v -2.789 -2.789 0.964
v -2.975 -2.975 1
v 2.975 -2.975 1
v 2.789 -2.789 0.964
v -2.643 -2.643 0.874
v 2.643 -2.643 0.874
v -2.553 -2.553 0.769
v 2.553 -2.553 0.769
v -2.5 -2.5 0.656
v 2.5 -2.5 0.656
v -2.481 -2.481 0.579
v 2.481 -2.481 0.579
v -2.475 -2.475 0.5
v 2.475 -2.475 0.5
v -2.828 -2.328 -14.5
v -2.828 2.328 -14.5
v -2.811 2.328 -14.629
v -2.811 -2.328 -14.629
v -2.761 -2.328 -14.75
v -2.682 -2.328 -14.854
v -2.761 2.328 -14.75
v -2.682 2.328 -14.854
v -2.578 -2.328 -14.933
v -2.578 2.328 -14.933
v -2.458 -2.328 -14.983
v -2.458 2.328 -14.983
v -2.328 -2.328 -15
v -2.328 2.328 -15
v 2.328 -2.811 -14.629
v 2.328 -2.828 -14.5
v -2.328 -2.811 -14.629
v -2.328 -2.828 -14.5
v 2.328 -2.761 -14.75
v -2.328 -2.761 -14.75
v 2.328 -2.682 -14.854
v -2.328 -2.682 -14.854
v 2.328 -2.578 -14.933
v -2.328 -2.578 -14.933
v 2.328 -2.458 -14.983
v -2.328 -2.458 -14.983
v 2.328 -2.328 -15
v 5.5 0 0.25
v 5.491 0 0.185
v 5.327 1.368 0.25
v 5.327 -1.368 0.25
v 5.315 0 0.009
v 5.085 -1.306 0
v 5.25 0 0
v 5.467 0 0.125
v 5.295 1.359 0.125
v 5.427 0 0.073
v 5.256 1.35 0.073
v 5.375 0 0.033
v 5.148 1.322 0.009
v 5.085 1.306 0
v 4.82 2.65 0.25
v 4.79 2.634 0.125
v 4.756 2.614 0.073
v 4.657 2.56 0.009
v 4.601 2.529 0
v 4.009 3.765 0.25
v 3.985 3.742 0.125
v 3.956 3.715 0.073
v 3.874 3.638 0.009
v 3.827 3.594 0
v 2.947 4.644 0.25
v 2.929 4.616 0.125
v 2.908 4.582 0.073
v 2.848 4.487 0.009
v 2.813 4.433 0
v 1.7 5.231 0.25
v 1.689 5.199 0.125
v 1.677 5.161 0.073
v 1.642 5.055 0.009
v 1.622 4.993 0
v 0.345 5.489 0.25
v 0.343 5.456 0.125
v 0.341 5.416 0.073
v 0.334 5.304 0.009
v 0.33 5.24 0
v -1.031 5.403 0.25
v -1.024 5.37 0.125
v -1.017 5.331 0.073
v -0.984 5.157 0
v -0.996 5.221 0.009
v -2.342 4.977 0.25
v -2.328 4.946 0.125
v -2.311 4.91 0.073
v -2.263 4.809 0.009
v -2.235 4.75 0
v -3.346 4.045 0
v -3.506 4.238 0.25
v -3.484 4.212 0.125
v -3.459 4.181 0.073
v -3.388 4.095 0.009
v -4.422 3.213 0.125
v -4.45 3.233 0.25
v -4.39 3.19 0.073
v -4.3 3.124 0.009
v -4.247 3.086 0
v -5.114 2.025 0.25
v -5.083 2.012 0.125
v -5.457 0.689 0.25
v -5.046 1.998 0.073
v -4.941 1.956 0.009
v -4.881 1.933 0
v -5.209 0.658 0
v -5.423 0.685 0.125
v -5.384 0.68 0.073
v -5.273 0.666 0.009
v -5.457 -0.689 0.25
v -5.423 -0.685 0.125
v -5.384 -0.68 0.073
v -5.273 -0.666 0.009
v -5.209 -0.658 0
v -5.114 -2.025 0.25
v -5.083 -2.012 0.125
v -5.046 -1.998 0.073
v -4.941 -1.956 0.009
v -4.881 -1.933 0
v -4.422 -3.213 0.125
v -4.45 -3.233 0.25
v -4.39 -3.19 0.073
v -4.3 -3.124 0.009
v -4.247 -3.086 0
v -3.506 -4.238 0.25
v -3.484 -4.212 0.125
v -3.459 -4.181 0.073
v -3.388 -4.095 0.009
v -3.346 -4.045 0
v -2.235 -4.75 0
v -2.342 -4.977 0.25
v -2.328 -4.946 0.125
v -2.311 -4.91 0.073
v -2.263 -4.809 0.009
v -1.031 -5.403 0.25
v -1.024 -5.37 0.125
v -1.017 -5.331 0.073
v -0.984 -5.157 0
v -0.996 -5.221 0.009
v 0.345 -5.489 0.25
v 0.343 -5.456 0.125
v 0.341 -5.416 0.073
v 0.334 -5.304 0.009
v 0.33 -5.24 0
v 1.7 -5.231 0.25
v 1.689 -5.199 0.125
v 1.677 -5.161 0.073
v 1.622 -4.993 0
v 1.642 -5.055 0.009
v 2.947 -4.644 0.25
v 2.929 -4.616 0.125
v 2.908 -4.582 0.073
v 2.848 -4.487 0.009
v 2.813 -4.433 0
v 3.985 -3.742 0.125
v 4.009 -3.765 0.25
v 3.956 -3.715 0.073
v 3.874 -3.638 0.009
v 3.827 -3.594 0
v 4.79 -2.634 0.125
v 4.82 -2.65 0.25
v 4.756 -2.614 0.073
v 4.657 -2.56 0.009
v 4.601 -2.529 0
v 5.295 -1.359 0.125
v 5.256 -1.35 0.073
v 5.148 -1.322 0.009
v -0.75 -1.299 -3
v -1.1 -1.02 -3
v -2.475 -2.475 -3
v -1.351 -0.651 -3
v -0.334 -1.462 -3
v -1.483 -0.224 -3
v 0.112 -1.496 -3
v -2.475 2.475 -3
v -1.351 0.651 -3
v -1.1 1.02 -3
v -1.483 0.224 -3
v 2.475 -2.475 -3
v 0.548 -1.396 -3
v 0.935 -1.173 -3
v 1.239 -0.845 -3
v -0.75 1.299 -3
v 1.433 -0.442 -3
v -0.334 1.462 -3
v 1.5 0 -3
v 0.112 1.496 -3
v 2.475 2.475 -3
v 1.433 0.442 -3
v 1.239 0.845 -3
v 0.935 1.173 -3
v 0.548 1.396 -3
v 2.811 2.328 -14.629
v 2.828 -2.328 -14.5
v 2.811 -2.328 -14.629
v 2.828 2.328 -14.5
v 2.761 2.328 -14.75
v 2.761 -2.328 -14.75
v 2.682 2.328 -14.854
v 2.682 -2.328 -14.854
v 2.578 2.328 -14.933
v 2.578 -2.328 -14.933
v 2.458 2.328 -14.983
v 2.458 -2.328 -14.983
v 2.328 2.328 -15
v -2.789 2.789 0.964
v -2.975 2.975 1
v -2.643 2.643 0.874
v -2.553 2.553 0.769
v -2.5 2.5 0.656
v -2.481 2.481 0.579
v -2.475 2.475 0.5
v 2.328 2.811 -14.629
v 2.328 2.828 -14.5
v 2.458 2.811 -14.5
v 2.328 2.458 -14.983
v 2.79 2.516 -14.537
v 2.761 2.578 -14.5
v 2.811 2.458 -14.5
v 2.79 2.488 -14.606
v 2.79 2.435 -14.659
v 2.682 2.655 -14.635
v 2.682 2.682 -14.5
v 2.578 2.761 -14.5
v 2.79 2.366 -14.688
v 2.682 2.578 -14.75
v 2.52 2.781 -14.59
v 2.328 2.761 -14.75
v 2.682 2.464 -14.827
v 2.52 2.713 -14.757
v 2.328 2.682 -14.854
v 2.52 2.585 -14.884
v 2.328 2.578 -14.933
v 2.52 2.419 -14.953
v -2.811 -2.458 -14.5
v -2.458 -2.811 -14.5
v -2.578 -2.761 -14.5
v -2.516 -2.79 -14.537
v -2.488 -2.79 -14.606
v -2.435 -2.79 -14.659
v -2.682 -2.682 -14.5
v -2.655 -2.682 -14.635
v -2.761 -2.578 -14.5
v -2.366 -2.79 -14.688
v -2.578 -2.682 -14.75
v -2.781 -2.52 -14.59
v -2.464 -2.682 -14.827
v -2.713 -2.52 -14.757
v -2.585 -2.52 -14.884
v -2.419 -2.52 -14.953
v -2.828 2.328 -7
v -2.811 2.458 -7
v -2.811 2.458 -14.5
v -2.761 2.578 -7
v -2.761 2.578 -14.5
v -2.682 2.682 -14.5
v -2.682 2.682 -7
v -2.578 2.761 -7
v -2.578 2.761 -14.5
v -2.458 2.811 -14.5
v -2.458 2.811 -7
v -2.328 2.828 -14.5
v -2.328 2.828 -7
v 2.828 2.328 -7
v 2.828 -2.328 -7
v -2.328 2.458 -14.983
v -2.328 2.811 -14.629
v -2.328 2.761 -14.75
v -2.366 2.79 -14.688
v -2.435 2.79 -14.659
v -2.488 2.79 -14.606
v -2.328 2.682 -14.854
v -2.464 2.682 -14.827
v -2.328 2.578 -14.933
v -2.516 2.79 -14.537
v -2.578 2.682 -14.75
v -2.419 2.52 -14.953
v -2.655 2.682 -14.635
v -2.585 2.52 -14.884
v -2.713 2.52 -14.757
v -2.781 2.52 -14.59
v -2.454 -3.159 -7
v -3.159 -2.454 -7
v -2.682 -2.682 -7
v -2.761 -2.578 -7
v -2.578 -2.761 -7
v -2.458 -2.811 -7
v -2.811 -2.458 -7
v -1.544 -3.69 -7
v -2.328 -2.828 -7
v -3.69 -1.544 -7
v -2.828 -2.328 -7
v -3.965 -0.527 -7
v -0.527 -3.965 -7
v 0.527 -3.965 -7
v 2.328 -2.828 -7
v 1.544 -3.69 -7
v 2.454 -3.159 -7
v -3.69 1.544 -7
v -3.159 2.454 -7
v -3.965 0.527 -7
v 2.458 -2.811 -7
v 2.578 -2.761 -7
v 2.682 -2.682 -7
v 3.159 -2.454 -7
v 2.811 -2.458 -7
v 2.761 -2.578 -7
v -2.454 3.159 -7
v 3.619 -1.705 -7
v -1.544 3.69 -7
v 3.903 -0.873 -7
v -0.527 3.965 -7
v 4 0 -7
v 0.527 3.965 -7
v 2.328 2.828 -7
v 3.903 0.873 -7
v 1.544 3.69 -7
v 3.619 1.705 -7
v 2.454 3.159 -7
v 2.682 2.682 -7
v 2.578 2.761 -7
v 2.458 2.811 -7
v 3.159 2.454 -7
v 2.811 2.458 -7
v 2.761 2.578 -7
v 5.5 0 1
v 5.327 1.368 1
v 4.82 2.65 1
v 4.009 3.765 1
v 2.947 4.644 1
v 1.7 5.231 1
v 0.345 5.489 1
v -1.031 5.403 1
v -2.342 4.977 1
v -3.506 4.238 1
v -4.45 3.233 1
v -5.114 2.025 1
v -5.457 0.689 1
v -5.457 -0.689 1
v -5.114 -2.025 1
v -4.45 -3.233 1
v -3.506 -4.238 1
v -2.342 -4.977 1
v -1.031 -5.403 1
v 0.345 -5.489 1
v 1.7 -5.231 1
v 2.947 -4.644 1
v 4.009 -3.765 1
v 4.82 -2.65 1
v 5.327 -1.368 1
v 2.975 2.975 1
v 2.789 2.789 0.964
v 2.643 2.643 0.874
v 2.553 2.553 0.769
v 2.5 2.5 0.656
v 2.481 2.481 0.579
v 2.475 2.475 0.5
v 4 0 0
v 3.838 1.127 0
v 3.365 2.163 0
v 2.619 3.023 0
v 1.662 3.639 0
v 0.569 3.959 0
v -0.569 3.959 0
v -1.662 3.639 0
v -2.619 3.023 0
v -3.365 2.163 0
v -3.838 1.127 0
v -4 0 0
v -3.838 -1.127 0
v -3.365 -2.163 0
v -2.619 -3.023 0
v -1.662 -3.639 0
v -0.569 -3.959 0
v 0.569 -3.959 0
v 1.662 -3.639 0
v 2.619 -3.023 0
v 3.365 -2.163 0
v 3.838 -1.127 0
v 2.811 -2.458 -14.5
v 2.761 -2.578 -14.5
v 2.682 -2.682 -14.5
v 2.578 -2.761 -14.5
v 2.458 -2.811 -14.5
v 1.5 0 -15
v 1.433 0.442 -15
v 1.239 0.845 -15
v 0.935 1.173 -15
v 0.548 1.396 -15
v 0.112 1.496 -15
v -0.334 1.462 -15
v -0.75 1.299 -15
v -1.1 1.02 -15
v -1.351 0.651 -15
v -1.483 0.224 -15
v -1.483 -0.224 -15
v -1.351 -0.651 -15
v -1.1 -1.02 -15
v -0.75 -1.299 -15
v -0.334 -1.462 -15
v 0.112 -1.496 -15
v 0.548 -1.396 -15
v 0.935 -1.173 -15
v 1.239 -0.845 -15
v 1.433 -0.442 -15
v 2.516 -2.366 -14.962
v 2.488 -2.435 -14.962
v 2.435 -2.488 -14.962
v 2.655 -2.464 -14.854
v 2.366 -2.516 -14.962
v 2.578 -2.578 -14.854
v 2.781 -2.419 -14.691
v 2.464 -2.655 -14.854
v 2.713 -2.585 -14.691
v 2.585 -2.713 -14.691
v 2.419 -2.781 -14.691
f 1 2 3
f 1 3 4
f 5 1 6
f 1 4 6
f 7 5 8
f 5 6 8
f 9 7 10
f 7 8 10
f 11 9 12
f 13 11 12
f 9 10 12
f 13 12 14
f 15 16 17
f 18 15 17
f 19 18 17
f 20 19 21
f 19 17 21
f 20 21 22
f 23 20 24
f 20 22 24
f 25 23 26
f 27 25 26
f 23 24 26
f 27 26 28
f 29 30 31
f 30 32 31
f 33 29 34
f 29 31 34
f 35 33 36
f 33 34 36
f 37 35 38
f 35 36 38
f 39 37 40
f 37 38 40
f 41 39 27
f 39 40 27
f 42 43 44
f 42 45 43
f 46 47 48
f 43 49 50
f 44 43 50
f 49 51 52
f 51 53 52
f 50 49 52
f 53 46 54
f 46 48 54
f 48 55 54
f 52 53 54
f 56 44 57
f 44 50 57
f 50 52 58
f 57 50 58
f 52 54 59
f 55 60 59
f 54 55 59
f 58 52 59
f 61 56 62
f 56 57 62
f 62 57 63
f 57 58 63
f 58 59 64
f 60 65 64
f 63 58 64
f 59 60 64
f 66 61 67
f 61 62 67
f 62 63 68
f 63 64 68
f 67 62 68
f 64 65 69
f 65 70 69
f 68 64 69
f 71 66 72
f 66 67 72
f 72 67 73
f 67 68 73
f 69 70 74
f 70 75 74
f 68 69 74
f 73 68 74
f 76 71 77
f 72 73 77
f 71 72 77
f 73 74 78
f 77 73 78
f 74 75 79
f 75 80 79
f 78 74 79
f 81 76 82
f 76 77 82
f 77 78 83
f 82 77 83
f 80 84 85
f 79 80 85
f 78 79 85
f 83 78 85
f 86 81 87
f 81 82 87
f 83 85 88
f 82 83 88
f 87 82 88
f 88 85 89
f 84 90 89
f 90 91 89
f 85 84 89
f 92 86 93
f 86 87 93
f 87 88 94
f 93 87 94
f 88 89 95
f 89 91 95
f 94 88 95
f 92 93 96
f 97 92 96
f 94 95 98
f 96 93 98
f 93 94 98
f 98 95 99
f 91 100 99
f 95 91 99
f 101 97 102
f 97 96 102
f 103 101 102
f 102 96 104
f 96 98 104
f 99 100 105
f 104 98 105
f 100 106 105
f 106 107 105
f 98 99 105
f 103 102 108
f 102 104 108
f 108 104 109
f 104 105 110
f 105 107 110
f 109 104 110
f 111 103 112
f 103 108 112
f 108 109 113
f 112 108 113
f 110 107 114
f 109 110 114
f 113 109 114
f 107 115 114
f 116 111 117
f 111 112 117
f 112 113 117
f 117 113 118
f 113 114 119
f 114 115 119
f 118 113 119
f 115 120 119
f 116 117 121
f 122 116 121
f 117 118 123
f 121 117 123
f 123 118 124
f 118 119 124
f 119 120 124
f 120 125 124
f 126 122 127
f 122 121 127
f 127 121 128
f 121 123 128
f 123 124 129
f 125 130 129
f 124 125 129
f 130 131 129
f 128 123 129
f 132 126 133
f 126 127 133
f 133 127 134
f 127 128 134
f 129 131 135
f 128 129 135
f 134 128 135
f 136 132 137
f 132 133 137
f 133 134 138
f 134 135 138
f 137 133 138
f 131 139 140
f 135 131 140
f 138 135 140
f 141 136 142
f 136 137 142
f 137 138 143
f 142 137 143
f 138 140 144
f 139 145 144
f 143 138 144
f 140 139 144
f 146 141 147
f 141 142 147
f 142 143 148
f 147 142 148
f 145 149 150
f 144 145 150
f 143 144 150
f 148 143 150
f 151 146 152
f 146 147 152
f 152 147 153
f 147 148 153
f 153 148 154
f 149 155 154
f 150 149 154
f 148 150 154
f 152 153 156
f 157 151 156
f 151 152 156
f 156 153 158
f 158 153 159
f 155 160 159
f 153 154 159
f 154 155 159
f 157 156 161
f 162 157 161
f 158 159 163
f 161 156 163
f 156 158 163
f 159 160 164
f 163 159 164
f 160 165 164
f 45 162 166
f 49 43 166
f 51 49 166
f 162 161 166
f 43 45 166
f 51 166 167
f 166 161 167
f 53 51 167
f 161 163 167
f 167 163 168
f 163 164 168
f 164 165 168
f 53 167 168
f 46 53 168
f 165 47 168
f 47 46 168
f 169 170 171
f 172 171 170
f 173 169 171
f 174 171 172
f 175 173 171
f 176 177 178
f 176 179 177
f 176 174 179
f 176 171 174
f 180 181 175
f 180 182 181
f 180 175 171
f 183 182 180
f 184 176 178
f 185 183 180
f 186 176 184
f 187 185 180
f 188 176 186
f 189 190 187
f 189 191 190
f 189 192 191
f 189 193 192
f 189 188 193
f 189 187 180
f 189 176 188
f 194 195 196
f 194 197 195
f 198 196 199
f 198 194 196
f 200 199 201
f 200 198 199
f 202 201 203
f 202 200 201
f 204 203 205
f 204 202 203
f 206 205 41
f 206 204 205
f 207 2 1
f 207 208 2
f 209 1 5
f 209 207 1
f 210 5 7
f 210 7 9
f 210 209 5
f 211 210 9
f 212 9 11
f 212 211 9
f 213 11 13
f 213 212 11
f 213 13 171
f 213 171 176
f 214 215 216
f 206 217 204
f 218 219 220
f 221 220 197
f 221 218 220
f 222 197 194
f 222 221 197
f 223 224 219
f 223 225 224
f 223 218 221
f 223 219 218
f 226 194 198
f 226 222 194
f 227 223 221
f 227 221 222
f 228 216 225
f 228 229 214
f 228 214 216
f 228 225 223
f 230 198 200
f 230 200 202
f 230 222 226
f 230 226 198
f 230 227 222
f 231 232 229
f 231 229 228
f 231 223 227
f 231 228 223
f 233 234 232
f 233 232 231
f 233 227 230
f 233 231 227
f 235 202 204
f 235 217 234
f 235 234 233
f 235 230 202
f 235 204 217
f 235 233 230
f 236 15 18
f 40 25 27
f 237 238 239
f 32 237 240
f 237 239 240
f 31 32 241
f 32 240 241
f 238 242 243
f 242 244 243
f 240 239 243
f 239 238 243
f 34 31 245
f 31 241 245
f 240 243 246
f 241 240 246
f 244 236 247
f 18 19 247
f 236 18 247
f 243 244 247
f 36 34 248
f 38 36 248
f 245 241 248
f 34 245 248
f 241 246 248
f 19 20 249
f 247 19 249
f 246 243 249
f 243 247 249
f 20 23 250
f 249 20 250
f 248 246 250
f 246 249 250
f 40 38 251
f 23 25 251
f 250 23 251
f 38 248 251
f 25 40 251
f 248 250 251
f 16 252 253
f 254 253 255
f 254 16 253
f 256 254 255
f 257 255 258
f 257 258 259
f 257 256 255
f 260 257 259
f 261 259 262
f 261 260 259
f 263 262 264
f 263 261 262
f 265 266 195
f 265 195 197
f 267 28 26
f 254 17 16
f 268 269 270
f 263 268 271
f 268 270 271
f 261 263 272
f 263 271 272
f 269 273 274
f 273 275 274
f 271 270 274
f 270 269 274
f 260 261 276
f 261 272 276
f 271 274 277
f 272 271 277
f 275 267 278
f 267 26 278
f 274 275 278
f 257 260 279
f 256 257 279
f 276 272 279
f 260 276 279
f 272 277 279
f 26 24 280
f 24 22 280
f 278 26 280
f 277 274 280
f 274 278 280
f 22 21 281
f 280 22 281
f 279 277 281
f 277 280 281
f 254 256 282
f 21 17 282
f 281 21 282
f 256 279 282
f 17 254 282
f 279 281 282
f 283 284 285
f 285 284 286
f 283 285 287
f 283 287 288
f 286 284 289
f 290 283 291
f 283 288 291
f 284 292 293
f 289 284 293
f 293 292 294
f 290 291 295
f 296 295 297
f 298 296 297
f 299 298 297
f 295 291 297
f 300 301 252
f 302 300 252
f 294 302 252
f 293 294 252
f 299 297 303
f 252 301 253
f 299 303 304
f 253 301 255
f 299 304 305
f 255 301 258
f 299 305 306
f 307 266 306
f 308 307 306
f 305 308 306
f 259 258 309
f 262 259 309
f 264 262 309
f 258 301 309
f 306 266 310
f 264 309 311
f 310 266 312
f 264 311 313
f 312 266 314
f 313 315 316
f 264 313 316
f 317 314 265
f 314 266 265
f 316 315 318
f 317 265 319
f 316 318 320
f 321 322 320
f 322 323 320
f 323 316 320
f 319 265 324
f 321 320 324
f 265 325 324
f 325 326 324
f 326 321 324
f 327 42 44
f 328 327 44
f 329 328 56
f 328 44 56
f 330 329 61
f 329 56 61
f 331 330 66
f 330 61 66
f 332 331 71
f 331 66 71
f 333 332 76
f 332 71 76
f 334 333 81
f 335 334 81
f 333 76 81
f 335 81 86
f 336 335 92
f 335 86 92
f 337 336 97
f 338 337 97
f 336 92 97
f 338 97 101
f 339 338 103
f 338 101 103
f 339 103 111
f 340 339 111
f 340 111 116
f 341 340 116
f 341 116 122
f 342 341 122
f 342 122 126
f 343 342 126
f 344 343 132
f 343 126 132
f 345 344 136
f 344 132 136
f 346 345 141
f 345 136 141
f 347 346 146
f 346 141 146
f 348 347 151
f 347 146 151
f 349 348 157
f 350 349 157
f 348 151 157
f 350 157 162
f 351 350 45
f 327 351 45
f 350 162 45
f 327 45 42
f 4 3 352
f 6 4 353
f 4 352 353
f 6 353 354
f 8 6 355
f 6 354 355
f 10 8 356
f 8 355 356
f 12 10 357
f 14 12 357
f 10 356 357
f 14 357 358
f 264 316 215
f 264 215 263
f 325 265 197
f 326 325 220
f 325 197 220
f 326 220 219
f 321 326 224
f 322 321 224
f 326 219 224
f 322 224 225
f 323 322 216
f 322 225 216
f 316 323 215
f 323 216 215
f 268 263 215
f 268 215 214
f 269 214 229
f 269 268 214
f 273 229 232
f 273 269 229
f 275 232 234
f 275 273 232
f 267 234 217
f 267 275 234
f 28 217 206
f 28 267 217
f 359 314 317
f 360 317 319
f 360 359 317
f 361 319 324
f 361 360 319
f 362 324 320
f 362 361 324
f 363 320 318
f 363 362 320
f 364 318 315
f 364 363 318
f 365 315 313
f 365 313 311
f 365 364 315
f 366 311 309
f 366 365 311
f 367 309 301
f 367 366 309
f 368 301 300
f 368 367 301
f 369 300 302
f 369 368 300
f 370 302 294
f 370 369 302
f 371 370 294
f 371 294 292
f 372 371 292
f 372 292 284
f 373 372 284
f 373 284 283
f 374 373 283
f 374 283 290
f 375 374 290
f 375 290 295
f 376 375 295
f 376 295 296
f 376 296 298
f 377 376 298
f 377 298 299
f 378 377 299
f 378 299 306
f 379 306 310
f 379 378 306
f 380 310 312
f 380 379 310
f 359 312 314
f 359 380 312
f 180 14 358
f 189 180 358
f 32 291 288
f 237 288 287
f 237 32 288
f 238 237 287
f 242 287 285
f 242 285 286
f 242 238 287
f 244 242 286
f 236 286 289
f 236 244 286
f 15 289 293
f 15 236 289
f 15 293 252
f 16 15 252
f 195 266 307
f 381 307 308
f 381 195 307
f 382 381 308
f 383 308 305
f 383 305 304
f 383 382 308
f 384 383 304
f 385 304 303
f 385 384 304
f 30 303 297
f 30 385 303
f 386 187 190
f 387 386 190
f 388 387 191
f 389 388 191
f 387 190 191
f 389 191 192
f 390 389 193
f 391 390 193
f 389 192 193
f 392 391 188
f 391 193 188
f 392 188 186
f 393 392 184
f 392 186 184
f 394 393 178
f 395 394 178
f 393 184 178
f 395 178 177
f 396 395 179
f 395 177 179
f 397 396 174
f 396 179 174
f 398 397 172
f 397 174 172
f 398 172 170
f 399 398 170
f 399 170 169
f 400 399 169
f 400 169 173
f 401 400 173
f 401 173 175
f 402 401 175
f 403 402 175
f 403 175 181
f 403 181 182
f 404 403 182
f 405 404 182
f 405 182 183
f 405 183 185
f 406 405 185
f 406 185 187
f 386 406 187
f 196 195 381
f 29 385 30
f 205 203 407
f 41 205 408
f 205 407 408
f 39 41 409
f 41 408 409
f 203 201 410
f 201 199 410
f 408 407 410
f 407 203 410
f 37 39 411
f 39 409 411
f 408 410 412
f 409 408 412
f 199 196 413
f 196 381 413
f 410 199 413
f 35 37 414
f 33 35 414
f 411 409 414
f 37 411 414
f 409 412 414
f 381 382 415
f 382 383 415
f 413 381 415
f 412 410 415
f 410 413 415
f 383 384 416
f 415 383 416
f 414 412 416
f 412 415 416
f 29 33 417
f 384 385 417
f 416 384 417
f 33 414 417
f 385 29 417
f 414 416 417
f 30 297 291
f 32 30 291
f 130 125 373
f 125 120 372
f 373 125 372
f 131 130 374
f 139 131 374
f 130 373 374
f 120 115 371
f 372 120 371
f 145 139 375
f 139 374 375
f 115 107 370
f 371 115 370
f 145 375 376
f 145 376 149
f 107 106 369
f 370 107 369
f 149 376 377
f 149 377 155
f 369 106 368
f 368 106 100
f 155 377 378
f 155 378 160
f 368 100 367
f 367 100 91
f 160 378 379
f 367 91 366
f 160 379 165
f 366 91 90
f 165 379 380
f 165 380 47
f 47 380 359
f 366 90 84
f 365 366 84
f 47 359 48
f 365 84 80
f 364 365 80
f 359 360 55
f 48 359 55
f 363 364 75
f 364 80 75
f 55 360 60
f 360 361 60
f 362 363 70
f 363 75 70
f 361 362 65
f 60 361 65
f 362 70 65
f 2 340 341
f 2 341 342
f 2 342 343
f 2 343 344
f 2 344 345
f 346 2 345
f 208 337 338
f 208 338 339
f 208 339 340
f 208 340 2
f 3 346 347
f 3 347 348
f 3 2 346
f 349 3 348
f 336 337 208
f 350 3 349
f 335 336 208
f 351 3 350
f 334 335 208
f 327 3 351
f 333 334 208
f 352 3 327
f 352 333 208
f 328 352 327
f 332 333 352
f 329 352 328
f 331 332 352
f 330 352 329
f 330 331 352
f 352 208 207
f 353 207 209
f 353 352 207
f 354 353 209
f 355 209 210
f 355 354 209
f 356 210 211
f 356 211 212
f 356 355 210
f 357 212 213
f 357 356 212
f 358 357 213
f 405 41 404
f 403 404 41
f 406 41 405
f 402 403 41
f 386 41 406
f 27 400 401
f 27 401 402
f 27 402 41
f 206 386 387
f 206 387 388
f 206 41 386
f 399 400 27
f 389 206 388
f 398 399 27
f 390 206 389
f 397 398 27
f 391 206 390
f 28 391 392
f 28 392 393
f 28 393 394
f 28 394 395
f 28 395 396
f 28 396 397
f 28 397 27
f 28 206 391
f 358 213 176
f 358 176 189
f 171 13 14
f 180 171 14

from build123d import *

# Parameters (mm, degrees)
ESQUISSE1_R      = 4
EXTRUSION1_DEPTH = 7
ESQUISSE3_W      = 5.65685425
ESQUISSE3_H      = 5.65685425
EXTRUSION3_DEPTH = 8
CONG_4_R         = 0.5
ESQUISSE7_R      = 5.5
EXTRUSION6_DEPTH = 1
ESQUISSE8_R      = 1.5
EXTRUSION7_DEPTH = 18.790446875
ESQUISSE9_W      = 4.949747468
ESQUISSE9_H      = 4.949747468
EXTRUSION8_DEPTH = 4
CONG_5_R         = 0.25
CONG_6_R         = 0.5


with BuildPart() as part:
    # Esquisse1 → Extrusion1 (new body)
    with BuildSketch(Plane.XY):
        Circle(ESQUISSE1_R)
    extrude(amount=-EXTRUSION1_DEPTH)

    # Esquisse3 → Extrusion3 (add)
    with BuildSketch(Plane(origin=(0, 0, -7), x_dir=(-1, 0, 0), z_dir=(0, 0, -1))):
        Rectangle(ESQUISSE3_W, ESQUISSE3_H)
    extrude(amount=EXTRUSION3_DEPTH)

    # Congé4
    cong_4_edges = [part.edges().sort_by_distance(p)[0] for p in [
        (-2.828427125, 0, -15),
        (0, 2.828427125, -15),
        (2.828427125, 2.828427125, -11),
        (2.828427125, -2.828427125, -11),
        (-2.828427125, -2.828427125, -11),
        (-2.828427125, 2.828427125, -11),
        (2.828427125, 0, -15),
        (0, -2.828427125, -15),
    ]]
    fillet(cong_4_edges, radius=CONG_4_R)

    # Esquisse7 → Extrusion6 (add)
    with BuildSketch(Plane.XY):
        Circle(ESQUISSE7_R)
    extrude(amount=EXTRUSION6_DEPTH)

    # Esquisse8 → Extrusion7 (cut, through all)
    with BuildSketch(Plane.XY.offset(1)):
        Circle(ESQUISSE8_R)
    extrude(amount=-EXTRUSION7_DEPTH, mode=Mode.SUBTRACT)

    # Esquisse9 → Extrusion8 (cut)
    with BuildSketch(Plane.XY.offset(1)):
        Rectangle(ESQUISSE9_W, ESQUISSE9_H)
    extrude(amount=-EXTRUSION8_DEPTH, mode=Mode.SUBTRACT)

    # Congé5
    cong_5_edges = [part.edges().sort_by_distance(p)[0] for p in [
        (-5.5, 0, 0),
    ]]
    fillet(cong_5_edges, radius=CONG_5_R)

    # Congé6
    cong_6_edges = [part.edges().sort_by_distance(p)[0] for p in [
        (-2.474873734, 0, 1),
        (0, -2.474873734, 1),
        (2.474873734, 0, 1),
        (0, 2.474873734, 1),
    ]]
    fillet(cong_6_edges, radius=CONG_6_R)


solid = part.part
